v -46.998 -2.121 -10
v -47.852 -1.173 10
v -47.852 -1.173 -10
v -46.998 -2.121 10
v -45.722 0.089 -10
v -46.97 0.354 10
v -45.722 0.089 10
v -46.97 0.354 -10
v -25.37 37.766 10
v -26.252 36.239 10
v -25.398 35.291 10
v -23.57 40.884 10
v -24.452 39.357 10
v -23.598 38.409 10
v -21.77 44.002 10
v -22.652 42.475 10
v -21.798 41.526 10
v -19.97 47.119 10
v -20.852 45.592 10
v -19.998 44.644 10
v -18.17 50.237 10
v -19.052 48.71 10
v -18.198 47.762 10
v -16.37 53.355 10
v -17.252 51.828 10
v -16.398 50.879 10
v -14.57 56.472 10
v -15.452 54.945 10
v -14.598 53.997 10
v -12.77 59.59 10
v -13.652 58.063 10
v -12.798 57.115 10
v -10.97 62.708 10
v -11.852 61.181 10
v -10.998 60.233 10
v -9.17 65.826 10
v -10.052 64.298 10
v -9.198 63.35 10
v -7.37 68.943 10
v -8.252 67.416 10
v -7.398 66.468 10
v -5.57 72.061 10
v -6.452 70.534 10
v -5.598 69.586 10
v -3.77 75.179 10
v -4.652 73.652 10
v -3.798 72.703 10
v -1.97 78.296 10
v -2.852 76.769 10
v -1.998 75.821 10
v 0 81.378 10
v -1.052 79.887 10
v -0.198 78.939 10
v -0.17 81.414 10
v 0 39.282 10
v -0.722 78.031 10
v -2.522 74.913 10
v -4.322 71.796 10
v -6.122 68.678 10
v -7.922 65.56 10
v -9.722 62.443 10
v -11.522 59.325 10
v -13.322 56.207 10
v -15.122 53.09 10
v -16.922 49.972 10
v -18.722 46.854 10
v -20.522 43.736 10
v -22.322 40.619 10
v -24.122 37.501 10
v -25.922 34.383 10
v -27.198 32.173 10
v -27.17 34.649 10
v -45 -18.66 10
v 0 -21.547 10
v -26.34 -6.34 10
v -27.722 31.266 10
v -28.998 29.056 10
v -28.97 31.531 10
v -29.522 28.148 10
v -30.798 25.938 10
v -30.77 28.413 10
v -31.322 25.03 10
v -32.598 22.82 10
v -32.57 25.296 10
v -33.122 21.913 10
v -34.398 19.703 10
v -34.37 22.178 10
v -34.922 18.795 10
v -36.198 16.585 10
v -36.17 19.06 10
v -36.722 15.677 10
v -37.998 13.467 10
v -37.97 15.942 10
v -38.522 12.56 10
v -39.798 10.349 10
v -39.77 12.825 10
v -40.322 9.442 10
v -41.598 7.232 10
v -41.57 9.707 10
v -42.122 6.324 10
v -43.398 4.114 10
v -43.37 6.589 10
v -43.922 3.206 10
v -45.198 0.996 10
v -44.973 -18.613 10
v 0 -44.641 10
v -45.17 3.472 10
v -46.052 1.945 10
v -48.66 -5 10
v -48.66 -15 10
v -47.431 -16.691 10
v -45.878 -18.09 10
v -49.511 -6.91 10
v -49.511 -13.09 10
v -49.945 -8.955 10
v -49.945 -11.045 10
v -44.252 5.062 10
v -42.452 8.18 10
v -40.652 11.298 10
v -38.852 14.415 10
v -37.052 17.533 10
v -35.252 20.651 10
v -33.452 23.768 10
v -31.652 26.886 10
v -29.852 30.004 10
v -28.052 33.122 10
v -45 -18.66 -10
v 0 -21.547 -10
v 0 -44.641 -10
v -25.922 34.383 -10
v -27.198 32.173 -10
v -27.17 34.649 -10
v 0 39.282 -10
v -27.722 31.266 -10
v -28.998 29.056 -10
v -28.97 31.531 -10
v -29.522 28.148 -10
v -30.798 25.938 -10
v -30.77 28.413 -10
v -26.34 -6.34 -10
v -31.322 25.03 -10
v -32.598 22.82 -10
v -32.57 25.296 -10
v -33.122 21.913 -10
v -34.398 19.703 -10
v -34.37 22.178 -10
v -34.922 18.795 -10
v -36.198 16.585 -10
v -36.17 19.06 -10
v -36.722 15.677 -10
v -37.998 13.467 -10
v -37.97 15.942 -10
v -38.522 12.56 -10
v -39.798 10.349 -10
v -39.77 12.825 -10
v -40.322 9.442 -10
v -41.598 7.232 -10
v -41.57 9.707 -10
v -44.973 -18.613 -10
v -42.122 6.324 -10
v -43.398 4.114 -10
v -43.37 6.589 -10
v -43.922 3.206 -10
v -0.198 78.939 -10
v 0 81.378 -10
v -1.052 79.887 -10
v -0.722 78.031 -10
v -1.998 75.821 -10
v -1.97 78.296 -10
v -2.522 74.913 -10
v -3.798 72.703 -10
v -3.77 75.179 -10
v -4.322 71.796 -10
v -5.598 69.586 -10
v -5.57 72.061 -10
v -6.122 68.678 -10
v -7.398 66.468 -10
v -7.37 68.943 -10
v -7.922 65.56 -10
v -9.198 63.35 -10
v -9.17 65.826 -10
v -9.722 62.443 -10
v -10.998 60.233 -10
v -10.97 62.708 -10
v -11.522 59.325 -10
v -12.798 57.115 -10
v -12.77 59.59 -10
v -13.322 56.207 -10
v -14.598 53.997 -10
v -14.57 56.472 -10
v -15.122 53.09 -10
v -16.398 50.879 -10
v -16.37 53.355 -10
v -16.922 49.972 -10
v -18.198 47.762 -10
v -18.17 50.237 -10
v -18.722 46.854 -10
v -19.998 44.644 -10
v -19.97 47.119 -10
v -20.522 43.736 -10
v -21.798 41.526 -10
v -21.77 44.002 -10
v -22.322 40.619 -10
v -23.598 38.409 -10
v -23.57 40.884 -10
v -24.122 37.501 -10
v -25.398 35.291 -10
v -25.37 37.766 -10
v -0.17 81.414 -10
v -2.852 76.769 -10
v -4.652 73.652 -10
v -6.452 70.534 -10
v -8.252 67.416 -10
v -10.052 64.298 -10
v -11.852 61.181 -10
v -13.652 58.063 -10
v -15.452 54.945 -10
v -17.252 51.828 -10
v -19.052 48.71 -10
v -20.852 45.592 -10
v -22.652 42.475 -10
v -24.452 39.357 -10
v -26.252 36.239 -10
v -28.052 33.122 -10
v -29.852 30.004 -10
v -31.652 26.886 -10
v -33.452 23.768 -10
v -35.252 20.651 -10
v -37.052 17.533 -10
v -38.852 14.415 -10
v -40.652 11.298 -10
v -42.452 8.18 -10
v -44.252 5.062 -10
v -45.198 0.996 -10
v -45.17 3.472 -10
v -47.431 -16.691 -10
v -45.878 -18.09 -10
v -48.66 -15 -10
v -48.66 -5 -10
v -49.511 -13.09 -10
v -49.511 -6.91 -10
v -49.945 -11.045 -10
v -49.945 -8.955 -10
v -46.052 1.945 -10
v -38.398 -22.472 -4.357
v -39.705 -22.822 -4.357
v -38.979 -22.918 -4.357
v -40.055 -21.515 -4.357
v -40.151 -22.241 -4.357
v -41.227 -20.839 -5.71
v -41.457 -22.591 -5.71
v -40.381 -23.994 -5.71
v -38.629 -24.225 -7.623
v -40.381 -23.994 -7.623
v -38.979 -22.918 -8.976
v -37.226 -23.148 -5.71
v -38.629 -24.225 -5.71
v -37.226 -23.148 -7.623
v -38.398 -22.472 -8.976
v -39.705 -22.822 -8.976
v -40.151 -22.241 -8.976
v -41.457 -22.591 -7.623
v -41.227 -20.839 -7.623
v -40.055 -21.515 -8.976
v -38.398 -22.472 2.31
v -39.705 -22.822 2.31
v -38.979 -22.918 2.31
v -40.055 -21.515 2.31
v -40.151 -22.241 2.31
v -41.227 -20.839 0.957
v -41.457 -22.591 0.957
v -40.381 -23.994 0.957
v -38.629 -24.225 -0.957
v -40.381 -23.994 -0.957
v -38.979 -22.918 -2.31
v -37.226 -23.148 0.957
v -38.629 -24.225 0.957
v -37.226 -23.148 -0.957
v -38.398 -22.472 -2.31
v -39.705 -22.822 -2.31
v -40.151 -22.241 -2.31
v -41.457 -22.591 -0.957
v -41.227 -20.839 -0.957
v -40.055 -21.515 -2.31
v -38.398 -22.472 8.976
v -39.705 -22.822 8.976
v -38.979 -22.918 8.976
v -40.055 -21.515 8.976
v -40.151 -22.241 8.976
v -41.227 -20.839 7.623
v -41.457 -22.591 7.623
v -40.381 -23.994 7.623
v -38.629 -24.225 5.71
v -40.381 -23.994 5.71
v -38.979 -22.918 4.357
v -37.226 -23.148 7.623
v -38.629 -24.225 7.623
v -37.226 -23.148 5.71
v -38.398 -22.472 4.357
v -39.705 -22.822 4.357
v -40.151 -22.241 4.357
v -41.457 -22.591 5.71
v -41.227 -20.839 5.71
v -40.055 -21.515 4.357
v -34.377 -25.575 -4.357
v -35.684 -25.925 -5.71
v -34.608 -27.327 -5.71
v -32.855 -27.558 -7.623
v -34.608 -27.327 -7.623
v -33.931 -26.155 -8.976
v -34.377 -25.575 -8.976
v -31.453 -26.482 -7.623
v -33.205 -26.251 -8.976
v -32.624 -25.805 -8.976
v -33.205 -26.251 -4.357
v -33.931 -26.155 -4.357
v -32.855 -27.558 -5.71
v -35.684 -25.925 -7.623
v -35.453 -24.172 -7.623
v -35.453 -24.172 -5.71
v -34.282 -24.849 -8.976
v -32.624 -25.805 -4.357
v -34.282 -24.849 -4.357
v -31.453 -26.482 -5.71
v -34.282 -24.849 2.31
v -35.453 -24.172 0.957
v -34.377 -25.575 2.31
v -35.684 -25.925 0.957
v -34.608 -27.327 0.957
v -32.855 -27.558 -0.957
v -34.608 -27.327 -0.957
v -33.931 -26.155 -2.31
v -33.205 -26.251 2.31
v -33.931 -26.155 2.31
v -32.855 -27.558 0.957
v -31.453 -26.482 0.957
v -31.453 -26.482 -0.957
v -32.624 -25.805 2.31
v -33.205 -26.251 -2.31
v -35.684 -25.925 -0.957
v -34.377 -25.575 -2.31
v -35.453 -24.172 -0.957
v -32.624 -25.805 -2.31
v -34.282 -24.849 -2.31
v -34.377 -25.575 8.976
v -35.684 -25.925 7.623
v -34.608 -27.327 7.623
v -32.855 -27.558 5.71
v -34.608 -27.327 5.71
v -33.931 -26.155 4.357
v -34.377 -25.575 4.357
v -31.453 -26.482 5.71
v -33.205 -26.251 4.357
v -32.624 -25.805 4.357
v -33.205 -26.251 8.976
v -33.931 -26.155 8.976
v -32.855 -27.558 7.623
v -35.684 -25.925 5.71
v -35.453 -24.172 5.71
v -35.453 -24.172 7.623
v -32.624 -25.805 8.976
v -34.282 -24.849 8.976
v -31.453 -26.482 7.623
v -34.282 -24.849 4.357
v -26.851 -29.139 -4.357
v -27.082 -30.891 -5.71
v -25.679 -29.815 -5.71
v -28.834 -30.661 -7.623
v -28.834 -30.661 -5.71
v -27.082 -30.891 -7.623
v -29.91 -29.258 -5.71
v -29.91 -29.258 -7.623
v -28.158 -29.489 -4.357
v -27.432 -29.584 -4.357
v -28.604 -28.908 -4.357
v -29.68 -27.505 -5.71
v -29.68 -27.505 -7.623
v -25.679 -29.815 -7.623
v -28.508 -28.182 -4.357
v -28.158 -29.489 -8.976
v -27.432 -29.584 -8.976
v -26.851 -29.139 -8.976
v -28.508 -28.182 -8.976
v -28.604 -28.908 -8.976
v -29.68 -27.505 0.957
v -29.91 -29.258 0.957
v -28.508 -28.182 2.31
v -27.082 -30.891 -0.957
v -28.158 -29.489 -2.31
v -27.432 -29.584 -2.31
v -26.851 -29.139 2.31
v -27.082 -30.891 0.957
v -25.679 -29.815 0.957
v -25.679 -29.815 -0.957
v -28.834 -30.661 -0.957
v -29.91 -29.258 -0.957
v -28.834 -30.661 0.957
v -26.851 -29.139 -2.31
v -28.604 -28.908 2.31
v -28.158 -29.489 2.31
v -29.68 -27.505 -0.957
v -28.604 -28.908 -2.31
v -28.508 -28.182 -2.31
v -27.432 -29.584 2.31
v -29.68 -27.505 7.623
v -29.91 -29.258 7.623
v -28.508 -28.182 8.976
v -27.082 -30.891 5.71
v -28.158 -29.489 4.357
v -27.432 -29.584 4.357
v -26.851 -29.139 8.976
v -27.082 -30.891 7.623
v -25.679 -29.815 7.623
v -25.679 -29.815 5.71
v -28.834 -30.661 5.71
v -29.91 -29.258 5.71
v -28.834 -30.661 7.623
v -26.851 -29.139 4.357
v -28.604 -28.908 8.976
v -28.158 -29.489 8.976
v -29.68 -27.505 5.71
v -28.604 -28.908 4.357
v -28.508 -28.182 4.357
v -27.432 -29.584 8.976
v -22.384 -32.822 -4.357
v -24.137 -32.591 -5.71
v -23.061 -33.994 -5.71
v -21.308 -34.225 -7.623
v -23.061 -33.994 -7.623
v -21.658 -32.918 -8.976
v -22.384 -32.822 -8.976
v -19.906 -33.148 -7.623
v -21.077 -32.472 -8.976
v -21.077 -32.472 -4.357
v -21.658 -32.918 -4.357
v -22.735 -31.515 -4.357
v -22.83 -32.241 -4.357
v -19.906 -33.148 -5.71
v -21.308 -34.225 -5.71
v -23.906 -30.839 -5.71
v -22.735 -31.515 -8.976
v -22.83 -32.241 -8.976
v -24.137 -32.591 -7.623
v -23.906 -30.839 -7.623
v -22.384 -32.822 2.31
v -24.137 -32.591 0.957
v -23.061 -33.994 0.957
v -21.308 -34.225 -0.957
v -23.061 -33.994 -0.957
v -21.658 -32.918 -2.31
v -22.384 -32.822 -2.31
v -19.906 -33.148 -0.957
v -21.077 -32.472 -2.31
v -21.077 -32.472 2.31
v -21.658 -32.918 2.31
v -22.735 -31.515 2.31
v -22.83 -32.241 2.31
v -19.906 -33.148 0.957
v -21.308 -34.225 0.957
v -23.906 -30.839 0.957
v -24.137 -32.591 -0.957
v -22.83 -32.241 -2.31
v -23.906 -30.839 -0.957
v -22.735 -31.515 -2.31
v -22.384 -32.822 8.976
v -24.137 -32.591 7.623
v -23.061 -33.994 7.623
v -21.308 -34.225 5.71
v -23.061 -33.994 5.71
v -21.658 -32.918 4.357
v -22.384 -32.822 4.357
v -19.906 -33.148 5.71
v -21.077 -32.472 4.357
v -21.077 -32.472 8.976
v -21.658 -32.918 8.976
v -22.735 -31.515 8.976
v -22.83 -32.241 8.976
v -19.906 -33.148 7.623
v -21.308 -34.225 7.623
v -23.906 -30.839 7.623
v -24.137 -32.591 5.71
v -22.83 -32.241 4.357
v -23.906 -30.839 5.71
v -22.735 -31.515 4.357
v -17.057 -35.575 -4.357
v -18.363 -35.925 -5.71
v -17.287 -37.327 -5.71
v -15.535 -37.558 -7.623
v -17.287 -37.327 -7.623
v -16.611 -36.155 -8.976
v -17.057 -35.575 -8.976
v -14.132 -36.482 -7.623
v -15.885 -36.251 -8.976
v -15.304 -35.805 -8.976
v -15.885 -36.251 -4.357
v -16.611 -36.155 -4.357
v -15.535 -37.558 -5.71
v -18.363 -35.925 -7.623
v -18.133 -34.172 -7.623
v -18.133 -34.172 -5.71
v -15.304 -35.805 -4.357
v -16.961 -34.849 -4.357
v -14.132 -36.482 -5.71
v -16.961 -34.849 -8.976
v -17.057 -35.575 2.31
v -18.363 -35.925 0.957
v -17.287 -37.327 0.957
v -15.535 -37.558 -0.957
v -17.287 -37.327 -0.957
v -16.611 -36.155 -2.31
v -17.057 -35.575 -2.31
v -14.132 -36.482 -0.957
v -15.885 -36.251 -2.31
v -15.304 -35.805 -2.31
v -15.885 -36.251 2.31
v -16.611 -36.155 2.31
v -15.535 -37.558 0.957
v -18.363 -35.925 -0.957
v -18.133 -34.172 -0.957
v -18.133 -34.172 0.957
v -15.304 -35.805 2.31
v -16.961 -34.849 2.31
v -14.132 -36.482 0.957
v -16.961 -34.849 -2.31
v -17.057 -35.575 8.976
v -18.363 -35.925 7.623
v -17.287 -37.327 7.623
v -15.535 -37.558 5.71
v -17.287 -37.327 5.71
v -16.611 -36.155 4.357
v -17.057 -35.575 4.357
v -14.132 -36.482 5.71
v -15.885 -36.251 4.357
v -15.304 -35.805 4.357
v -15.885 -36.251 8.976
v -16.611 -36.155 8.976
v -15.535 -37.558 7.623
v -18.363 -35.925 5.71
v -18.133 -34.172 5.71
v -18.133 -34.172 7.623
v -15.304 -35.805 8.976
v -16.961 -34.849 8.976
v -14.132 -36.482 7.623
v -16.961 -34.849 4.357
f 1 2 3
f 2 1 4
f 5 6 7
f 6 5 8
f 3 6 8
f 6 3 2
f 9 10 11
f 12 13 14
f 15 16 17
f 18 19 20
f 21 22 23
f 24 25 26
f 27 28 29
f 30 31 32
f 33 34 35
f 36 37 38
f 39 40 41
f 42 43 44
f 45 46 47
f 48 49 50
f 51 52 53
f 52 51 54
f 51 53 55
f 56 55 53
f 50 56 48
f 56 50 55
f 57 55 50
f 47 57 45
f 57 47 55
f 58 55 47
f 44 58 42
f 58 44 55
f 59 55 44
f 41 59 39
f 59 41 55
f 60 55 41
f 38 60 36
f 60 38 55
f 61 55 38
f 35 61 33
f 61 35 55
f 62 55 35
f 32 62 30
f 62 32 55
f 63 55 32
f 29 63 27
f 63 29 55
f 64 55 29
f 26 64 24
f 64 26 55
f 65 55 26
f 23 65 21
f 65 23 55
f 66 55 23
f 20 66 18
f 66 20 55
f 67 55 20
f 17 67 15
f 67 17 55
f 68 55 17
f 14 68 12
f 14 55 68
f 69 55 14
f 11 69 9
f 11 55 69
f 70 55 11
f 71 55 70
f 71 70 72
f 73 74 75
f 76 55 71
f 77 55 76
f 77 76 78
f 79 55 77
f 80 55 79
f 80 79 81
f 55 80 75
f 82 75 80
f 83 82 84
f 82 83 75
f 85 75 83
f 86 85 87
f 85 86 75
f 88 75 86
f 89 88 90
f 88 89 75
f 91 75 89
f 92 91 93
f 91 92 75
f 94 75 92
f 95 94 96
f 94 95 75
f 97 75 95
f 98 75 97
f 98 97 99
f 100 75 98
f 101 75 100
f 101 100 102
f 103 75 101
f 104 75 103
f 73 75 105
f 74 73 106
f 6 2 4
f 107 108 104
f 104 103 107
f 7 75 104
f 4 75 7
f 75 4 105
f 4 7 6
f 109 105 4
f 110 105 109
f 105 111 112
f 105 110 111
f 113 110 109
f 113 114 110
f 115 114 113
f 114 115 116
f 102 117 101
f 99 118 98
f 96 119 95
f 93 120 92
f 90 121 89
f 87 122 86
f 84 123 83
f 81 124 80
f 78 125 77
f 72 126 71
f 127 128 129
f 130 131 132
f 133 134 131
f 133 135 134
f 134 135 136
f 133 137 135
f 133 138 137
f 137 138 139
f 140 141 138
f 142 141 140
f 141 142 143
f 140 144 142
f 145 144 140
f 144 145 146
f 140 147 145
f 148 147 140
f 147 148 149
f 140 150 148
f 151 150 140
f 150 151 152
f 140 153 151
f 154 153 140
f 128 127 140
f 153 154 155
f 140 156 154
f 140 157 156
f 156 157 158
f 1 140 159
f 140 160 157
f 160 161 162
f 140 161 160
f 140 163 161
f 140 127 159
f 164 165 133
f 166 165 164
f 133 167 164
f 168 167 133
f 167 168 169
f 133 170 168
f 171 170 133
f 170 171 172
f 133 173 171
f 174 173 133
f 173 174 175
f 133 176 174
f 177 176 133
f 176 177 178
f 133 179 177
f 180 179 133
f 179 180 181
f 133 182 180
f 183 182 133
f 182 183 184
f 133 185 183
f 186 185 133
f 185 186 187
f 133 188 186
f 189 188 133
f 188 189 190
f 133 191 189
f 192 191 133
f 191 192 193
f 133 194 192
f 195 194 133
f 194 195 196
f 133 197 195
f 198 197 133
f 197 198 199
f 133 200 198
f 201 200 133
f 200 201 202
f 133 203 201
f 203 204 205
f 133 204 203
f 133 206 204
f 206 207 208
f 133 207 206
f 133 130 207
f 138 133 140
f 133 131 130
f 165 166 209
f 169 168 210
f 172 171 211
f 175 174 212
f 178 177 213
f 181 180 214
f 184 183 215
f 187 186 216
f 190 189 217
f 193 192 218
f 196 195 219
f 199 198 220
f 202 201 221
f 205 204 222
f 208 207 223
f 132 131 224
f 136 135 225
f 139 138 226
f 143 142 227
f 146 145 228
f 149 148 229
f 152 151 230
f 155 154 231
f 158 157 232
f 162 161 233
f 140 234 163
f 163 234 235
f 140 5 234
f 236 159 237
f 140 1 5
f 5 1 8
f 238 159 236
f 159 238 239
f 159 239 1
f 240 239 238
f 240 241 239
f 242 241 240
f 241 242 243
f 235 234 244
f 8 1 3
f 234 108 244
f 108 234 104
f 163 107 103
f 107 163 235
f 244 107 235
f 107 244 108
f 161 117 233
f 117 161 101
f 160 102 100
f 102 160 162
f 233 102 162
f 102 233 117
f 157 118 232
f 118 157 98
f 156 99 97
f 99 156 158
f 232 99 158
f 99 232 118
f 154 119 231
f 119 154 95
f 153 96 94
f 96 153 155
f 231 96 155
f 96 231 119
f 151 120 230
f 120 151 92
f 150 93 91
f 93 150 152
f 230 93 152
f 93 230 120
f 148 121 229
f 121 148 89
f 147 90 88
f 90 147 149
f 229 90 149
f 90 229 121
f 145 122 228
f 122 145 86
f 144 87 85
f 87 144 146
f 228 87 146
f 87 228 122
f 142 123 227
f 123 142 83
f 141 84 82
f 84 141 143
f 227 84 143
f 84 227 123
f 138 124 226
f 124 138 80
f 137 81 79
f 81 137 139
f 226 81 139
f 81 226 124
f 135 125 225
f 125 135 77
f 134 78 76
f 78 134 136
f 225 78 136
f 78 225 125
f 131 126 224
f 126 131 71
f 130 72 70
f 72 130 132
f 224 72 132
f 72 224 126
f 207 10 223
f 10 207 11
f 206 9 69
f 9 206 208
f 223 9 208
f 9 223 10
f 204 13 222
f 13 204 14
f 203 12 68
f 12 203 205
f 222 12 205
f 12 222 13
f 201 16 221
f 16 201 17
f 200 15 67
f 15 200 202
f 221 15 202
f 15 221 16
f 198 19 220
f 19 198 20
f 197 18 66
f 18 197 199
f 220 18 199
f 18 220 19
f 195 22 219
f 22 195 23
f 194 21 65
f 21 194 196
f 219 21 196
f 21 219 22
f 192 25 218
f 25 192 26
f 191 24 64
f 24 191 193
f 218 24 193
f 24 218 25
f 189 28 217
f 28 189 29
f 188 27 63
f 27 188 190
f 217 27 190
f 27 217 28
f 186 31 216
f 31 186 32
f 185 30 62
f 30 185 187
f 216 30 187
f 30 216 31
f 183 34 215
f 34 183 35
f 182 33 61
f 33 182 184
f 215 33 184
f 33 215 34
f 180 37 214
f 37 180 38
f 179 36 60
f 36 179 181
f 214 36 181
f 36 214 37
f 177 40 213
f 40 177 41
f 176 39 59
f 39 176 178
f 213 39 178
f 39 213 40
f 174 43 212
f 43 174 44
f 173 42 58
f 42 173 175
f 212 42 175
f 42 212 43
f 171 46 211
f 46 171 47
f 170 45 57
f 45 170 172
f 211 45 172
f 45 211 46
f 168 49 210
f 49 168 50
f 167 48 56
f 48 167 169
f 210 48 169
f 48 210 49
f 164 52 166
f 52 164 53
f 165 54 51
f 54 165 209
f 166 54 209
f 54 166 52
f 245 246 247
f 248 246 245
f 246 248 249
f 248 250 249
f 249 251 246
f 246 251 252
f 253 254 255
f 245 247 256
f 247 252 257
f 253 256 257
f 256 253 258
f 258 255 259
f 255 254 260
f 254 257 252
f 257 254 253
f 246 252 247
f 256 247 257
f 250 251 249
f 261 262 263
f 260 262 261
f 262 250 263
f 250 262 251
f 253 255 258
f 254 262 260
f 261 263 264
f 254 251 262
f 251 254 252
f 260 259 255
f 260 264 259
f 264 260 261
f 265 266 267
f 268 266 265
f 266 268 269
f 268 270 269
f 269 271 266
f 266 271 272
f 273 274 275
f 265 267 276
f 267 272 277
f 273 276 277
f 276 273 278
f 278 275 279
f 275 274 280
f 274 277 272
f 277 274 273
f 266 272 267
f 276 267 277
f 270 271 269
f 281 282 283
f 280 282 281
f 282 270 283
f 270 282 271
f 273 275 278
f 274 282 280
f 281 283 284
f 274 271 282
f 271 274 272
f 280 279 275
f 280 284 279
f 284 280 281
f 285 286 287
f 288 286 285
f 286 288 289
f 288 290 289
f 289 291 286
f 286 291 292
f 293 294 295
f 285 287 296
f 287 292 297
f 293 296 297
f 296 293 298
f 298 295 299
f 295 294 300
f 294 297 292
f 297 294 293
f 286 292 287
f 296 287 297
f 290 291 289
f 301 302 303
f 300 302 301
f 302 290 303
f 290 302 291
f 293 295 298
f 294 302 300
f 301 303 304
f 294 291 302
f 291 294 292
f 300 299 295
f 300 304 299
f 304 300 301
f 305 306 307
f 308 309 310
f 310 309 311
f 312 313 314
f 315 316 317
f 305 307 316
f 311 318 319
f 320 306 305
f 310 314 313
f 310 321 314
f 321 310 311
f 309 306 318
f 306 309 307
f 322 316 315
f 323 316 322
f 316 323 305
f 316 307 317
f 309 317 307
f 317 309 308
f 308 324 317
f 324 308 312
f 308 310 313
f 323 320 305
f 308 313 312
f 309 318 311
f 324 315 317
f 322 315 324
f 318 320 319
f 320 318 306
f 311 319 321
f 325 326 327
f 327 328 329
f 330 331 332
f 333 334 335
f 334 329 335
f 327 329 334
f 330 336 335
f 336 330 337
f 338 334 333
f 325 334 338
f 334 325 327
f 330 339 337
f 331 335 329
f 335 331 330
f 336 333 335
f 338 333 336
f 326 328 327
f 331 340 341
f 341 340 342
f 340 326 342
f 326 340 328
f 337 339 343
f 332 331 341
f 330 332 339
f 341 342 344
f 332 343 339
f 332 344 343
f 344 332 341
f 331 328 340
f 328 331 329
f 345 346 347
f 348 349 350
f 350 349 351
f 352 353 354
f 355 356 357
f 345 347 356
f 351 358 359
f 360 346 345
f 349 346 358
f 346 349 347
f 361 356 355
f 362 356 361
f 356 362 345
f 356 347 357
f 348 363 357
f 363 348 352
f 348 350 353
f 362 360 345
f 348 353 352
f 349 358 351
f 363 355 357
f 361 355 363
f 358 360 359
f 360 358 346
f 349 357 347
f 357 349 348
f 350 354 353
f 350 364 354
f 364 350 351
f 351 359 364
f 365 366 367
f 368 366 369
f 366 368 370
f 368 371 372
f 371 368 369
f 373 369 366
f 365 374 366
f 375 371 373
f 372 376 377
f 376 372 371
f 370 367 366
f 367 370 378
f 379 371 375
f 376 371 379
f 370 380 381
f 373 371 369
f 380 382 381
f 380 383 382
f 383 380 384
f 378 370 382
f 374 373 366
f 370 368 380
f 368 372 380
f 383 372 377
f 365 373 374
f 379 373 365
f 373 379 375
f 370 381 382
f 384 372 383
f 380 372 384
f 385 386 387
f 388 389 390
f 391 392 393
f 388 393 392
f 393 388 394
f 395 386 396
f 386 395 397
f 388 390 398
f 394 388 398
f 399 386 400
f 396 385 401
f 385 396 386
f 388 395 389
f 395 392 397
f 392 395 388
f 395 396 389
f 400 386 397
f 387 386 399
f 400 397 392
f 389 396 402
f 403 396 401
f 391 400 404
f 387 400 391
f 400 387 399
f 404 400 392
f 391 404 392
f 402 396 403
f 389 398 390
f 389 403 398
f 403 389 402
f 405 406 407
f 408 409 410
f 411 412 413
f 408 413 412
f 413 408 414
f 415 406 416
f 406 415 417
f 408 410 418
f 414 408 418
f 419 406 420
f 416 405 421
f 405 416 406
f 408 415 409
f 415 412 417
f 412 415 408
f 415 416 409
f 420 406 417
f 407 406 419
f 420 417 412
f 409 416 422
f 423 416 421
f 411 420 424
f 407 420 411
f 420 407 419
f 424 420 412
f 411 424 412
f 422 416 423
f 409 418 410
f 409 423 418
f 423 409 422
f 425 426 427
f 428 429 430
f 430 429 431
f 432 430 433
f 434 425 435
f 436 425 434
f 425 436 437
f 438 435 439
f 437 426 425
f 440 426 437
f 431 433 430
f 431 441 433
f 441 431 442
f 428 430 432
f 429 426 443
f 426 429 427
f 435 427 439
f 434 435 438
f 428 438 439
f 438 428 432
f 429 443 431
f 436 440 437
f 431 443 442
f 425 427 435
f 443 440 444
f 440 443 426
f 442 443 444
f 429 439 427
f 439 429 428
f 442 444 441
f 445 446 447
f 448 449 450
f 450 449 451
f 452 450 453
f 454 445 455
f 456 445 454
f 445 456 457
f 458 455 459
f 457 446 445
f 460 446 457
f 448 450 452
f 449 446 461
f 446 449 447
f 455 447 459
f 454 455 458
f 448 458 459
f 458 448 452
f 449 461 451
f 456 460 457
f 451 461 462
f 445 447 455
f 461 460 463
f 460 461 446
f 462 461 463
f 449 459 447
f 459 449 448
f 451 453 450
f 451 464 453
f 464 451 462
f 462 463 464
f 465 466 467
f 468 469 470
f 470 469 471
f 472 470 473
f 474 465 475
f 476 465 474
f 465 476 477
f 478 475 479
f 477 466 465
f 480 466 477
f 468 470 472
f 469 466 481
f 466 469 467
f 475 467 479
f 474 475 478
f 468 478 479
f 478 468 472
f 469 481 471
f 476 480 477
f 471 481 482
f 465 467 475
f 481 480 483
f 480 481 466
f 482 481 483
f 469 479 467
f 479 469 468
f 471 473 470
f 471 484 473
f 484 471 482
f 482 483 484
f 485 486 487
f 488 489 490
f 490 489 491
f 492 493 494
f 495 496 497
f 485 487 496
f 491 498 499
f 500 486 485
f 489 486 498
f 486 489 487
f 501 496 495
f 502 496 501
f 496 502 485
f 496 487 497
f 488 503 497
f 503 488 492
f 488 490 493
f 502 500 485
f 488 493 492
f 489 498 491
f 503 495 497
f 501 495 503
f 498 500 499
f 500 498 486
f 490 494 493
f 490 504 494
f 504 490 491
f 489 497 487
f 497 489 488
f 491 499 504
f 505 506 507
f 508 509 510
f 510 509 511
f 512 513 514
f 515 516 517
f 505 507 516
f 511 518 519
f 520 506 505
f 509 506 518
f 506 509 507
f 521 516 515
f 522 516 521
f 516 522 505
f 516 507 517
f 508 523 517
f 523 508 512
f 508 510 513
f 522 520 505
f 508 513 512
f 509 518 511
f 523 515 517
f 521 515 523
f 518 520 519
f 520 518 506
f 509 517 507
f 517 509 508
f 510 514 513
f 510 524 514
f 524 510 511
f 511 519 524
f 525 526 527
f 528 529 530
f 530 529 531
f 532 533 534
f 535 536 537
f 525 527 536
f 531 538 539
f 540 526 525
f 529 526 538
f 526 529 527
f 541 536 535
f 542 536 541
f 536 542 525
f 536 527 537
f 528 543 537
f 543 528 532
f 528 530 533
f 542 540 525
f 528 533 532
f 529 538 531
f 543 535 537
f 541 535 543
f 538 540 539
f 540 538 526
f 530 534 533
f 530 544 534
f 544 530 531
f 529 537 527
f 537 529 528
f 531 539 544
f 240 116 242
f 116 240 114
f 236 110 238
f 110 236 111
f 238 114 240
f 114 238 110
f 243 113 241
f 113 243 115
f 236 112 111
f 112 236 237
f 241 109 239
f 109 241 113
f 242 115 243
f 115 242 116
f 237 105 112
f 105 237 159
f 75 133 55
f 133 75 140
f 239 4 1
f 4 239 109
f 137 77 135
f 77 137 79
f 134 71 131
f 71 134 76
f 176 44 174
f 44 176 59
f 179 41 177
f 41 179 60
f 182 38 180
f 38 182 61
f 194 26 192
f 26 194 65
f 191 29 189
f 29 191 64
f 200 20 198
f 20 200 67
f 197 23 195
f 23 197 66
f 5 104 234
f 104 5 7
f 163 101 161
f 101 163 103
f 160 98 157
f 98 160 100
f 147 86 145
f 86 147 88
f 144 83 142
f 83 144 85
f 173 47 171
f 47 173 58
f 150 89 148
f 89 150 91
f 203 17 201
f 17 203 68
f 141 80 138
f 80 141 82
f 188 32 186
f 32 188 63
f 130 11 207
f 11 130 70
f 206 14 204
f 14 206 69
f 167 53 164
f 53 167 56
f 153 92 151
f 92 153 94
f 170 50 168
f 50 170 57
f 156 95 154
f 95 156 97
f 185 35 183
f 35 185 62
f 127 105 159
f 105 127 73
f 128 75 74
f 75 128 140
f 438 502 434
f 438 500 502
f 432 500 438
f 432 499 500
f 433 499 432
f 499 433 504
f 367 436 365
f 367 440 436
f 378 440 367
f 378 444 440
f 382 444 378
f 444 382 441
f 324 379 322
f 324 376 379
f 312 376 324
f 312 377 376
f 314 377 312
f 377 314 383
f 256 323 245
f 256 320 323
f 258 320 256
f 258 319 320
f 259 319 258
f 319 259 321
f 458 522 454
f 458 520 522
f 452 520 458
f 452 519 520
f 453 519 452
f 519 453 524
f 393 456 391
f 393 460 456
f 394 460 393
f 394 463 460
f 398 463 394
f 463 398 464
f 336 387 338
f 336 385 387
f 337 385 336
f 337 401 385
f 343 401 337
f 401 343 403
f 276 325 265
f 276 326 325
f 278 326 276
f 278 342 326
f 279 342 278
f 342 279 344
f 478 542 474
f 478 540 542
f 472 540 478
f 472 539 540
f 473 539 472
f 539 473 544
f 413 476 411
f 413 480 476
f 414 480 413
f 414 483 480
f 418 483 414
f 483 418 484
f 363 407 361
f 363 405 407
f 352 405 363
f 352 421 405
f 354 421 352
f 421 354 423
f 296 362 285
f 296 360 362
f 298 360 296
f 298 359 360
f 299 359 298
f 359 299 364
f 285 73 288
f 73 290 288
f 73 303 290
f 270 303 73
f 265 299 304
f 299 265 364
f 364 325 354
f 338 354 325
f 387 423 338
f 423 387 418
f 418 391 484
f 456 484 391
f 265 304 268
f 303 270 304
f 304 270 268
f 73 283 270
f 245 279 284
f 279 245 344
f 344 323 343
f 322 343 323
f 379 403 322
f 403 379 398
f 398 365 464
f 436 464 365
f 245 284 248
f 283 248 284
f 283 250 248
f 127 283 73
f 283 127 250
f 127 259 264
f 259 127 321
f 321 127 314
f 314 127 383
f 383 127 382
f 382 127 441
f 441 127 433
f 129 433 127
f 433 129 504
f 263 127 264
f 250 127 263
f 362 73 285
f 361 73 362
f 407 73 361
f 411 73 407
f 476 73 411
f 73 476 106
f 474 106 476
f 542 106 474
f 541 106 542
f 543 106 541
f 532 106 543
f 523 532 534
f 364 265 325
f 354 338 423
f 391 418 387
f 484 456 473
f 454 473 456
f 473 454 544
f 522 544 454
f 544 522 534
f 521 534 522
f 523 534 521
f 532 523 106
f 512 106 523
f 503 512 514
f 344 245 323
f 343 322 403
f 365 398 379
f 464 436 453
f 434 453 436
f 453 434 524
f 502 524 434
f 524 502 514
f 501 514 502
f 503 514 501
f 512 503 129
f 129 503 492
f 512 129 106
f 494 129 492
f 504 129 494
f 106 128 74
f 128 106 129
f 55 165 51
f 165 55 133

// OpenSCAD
widgetWidth = 20; // [15:40]
widgetThickness = 20; // [15:50]
widgetHeight = 50; // [40:70]
stepSize = 3; // [2:5]

module theL(theWidth, theThickness, theHeight, theStep) {
  cylinder(h=theWidth, r=theThickness/2, center=true);
  translate(v=[0, 80, 0]) cube(size=[theThickness, 160, theWidth], center=true);  // long side
  translate(v=[60, 0, 0]) cube(size=[120, theThickness, theWidth], center=true);   // short side

  for (i = [1:55]) {
    translate(v=[-1*theThickness/2, i*theStep*1.2+1, 0]) cylinder(h=theWidth, r=theStep/2, center=true);
  }

  for (i = [1:5]) {
    translate(v=[i*theWidth/3, -1*theThickness/2, -1*theWidth/3]) sphere(r = theWidth/8);
    translate(v=[i*theWidth/3, -1*theThickness/2, 0]) sphere(r = theWidth/8);
    translate(v=[i*theWidth/3, -1*theThickness/2, 1*theWidth/3]) sphere(r = theWidth/8);
  }
}

 
difference() {
  translate(v=[widgetThickness/2-widgetHeight, -0.5*widgetThickness, 0]) rotate([0, 0, -30]) theL(widgetWidth, widgetThickness, widgetHeight, stepSize);
  translate(v=[200, 50, 0]) cube(size=[400, 800, 100], center=true);
}


// preview[view:south west, tilt:top diagonal]
